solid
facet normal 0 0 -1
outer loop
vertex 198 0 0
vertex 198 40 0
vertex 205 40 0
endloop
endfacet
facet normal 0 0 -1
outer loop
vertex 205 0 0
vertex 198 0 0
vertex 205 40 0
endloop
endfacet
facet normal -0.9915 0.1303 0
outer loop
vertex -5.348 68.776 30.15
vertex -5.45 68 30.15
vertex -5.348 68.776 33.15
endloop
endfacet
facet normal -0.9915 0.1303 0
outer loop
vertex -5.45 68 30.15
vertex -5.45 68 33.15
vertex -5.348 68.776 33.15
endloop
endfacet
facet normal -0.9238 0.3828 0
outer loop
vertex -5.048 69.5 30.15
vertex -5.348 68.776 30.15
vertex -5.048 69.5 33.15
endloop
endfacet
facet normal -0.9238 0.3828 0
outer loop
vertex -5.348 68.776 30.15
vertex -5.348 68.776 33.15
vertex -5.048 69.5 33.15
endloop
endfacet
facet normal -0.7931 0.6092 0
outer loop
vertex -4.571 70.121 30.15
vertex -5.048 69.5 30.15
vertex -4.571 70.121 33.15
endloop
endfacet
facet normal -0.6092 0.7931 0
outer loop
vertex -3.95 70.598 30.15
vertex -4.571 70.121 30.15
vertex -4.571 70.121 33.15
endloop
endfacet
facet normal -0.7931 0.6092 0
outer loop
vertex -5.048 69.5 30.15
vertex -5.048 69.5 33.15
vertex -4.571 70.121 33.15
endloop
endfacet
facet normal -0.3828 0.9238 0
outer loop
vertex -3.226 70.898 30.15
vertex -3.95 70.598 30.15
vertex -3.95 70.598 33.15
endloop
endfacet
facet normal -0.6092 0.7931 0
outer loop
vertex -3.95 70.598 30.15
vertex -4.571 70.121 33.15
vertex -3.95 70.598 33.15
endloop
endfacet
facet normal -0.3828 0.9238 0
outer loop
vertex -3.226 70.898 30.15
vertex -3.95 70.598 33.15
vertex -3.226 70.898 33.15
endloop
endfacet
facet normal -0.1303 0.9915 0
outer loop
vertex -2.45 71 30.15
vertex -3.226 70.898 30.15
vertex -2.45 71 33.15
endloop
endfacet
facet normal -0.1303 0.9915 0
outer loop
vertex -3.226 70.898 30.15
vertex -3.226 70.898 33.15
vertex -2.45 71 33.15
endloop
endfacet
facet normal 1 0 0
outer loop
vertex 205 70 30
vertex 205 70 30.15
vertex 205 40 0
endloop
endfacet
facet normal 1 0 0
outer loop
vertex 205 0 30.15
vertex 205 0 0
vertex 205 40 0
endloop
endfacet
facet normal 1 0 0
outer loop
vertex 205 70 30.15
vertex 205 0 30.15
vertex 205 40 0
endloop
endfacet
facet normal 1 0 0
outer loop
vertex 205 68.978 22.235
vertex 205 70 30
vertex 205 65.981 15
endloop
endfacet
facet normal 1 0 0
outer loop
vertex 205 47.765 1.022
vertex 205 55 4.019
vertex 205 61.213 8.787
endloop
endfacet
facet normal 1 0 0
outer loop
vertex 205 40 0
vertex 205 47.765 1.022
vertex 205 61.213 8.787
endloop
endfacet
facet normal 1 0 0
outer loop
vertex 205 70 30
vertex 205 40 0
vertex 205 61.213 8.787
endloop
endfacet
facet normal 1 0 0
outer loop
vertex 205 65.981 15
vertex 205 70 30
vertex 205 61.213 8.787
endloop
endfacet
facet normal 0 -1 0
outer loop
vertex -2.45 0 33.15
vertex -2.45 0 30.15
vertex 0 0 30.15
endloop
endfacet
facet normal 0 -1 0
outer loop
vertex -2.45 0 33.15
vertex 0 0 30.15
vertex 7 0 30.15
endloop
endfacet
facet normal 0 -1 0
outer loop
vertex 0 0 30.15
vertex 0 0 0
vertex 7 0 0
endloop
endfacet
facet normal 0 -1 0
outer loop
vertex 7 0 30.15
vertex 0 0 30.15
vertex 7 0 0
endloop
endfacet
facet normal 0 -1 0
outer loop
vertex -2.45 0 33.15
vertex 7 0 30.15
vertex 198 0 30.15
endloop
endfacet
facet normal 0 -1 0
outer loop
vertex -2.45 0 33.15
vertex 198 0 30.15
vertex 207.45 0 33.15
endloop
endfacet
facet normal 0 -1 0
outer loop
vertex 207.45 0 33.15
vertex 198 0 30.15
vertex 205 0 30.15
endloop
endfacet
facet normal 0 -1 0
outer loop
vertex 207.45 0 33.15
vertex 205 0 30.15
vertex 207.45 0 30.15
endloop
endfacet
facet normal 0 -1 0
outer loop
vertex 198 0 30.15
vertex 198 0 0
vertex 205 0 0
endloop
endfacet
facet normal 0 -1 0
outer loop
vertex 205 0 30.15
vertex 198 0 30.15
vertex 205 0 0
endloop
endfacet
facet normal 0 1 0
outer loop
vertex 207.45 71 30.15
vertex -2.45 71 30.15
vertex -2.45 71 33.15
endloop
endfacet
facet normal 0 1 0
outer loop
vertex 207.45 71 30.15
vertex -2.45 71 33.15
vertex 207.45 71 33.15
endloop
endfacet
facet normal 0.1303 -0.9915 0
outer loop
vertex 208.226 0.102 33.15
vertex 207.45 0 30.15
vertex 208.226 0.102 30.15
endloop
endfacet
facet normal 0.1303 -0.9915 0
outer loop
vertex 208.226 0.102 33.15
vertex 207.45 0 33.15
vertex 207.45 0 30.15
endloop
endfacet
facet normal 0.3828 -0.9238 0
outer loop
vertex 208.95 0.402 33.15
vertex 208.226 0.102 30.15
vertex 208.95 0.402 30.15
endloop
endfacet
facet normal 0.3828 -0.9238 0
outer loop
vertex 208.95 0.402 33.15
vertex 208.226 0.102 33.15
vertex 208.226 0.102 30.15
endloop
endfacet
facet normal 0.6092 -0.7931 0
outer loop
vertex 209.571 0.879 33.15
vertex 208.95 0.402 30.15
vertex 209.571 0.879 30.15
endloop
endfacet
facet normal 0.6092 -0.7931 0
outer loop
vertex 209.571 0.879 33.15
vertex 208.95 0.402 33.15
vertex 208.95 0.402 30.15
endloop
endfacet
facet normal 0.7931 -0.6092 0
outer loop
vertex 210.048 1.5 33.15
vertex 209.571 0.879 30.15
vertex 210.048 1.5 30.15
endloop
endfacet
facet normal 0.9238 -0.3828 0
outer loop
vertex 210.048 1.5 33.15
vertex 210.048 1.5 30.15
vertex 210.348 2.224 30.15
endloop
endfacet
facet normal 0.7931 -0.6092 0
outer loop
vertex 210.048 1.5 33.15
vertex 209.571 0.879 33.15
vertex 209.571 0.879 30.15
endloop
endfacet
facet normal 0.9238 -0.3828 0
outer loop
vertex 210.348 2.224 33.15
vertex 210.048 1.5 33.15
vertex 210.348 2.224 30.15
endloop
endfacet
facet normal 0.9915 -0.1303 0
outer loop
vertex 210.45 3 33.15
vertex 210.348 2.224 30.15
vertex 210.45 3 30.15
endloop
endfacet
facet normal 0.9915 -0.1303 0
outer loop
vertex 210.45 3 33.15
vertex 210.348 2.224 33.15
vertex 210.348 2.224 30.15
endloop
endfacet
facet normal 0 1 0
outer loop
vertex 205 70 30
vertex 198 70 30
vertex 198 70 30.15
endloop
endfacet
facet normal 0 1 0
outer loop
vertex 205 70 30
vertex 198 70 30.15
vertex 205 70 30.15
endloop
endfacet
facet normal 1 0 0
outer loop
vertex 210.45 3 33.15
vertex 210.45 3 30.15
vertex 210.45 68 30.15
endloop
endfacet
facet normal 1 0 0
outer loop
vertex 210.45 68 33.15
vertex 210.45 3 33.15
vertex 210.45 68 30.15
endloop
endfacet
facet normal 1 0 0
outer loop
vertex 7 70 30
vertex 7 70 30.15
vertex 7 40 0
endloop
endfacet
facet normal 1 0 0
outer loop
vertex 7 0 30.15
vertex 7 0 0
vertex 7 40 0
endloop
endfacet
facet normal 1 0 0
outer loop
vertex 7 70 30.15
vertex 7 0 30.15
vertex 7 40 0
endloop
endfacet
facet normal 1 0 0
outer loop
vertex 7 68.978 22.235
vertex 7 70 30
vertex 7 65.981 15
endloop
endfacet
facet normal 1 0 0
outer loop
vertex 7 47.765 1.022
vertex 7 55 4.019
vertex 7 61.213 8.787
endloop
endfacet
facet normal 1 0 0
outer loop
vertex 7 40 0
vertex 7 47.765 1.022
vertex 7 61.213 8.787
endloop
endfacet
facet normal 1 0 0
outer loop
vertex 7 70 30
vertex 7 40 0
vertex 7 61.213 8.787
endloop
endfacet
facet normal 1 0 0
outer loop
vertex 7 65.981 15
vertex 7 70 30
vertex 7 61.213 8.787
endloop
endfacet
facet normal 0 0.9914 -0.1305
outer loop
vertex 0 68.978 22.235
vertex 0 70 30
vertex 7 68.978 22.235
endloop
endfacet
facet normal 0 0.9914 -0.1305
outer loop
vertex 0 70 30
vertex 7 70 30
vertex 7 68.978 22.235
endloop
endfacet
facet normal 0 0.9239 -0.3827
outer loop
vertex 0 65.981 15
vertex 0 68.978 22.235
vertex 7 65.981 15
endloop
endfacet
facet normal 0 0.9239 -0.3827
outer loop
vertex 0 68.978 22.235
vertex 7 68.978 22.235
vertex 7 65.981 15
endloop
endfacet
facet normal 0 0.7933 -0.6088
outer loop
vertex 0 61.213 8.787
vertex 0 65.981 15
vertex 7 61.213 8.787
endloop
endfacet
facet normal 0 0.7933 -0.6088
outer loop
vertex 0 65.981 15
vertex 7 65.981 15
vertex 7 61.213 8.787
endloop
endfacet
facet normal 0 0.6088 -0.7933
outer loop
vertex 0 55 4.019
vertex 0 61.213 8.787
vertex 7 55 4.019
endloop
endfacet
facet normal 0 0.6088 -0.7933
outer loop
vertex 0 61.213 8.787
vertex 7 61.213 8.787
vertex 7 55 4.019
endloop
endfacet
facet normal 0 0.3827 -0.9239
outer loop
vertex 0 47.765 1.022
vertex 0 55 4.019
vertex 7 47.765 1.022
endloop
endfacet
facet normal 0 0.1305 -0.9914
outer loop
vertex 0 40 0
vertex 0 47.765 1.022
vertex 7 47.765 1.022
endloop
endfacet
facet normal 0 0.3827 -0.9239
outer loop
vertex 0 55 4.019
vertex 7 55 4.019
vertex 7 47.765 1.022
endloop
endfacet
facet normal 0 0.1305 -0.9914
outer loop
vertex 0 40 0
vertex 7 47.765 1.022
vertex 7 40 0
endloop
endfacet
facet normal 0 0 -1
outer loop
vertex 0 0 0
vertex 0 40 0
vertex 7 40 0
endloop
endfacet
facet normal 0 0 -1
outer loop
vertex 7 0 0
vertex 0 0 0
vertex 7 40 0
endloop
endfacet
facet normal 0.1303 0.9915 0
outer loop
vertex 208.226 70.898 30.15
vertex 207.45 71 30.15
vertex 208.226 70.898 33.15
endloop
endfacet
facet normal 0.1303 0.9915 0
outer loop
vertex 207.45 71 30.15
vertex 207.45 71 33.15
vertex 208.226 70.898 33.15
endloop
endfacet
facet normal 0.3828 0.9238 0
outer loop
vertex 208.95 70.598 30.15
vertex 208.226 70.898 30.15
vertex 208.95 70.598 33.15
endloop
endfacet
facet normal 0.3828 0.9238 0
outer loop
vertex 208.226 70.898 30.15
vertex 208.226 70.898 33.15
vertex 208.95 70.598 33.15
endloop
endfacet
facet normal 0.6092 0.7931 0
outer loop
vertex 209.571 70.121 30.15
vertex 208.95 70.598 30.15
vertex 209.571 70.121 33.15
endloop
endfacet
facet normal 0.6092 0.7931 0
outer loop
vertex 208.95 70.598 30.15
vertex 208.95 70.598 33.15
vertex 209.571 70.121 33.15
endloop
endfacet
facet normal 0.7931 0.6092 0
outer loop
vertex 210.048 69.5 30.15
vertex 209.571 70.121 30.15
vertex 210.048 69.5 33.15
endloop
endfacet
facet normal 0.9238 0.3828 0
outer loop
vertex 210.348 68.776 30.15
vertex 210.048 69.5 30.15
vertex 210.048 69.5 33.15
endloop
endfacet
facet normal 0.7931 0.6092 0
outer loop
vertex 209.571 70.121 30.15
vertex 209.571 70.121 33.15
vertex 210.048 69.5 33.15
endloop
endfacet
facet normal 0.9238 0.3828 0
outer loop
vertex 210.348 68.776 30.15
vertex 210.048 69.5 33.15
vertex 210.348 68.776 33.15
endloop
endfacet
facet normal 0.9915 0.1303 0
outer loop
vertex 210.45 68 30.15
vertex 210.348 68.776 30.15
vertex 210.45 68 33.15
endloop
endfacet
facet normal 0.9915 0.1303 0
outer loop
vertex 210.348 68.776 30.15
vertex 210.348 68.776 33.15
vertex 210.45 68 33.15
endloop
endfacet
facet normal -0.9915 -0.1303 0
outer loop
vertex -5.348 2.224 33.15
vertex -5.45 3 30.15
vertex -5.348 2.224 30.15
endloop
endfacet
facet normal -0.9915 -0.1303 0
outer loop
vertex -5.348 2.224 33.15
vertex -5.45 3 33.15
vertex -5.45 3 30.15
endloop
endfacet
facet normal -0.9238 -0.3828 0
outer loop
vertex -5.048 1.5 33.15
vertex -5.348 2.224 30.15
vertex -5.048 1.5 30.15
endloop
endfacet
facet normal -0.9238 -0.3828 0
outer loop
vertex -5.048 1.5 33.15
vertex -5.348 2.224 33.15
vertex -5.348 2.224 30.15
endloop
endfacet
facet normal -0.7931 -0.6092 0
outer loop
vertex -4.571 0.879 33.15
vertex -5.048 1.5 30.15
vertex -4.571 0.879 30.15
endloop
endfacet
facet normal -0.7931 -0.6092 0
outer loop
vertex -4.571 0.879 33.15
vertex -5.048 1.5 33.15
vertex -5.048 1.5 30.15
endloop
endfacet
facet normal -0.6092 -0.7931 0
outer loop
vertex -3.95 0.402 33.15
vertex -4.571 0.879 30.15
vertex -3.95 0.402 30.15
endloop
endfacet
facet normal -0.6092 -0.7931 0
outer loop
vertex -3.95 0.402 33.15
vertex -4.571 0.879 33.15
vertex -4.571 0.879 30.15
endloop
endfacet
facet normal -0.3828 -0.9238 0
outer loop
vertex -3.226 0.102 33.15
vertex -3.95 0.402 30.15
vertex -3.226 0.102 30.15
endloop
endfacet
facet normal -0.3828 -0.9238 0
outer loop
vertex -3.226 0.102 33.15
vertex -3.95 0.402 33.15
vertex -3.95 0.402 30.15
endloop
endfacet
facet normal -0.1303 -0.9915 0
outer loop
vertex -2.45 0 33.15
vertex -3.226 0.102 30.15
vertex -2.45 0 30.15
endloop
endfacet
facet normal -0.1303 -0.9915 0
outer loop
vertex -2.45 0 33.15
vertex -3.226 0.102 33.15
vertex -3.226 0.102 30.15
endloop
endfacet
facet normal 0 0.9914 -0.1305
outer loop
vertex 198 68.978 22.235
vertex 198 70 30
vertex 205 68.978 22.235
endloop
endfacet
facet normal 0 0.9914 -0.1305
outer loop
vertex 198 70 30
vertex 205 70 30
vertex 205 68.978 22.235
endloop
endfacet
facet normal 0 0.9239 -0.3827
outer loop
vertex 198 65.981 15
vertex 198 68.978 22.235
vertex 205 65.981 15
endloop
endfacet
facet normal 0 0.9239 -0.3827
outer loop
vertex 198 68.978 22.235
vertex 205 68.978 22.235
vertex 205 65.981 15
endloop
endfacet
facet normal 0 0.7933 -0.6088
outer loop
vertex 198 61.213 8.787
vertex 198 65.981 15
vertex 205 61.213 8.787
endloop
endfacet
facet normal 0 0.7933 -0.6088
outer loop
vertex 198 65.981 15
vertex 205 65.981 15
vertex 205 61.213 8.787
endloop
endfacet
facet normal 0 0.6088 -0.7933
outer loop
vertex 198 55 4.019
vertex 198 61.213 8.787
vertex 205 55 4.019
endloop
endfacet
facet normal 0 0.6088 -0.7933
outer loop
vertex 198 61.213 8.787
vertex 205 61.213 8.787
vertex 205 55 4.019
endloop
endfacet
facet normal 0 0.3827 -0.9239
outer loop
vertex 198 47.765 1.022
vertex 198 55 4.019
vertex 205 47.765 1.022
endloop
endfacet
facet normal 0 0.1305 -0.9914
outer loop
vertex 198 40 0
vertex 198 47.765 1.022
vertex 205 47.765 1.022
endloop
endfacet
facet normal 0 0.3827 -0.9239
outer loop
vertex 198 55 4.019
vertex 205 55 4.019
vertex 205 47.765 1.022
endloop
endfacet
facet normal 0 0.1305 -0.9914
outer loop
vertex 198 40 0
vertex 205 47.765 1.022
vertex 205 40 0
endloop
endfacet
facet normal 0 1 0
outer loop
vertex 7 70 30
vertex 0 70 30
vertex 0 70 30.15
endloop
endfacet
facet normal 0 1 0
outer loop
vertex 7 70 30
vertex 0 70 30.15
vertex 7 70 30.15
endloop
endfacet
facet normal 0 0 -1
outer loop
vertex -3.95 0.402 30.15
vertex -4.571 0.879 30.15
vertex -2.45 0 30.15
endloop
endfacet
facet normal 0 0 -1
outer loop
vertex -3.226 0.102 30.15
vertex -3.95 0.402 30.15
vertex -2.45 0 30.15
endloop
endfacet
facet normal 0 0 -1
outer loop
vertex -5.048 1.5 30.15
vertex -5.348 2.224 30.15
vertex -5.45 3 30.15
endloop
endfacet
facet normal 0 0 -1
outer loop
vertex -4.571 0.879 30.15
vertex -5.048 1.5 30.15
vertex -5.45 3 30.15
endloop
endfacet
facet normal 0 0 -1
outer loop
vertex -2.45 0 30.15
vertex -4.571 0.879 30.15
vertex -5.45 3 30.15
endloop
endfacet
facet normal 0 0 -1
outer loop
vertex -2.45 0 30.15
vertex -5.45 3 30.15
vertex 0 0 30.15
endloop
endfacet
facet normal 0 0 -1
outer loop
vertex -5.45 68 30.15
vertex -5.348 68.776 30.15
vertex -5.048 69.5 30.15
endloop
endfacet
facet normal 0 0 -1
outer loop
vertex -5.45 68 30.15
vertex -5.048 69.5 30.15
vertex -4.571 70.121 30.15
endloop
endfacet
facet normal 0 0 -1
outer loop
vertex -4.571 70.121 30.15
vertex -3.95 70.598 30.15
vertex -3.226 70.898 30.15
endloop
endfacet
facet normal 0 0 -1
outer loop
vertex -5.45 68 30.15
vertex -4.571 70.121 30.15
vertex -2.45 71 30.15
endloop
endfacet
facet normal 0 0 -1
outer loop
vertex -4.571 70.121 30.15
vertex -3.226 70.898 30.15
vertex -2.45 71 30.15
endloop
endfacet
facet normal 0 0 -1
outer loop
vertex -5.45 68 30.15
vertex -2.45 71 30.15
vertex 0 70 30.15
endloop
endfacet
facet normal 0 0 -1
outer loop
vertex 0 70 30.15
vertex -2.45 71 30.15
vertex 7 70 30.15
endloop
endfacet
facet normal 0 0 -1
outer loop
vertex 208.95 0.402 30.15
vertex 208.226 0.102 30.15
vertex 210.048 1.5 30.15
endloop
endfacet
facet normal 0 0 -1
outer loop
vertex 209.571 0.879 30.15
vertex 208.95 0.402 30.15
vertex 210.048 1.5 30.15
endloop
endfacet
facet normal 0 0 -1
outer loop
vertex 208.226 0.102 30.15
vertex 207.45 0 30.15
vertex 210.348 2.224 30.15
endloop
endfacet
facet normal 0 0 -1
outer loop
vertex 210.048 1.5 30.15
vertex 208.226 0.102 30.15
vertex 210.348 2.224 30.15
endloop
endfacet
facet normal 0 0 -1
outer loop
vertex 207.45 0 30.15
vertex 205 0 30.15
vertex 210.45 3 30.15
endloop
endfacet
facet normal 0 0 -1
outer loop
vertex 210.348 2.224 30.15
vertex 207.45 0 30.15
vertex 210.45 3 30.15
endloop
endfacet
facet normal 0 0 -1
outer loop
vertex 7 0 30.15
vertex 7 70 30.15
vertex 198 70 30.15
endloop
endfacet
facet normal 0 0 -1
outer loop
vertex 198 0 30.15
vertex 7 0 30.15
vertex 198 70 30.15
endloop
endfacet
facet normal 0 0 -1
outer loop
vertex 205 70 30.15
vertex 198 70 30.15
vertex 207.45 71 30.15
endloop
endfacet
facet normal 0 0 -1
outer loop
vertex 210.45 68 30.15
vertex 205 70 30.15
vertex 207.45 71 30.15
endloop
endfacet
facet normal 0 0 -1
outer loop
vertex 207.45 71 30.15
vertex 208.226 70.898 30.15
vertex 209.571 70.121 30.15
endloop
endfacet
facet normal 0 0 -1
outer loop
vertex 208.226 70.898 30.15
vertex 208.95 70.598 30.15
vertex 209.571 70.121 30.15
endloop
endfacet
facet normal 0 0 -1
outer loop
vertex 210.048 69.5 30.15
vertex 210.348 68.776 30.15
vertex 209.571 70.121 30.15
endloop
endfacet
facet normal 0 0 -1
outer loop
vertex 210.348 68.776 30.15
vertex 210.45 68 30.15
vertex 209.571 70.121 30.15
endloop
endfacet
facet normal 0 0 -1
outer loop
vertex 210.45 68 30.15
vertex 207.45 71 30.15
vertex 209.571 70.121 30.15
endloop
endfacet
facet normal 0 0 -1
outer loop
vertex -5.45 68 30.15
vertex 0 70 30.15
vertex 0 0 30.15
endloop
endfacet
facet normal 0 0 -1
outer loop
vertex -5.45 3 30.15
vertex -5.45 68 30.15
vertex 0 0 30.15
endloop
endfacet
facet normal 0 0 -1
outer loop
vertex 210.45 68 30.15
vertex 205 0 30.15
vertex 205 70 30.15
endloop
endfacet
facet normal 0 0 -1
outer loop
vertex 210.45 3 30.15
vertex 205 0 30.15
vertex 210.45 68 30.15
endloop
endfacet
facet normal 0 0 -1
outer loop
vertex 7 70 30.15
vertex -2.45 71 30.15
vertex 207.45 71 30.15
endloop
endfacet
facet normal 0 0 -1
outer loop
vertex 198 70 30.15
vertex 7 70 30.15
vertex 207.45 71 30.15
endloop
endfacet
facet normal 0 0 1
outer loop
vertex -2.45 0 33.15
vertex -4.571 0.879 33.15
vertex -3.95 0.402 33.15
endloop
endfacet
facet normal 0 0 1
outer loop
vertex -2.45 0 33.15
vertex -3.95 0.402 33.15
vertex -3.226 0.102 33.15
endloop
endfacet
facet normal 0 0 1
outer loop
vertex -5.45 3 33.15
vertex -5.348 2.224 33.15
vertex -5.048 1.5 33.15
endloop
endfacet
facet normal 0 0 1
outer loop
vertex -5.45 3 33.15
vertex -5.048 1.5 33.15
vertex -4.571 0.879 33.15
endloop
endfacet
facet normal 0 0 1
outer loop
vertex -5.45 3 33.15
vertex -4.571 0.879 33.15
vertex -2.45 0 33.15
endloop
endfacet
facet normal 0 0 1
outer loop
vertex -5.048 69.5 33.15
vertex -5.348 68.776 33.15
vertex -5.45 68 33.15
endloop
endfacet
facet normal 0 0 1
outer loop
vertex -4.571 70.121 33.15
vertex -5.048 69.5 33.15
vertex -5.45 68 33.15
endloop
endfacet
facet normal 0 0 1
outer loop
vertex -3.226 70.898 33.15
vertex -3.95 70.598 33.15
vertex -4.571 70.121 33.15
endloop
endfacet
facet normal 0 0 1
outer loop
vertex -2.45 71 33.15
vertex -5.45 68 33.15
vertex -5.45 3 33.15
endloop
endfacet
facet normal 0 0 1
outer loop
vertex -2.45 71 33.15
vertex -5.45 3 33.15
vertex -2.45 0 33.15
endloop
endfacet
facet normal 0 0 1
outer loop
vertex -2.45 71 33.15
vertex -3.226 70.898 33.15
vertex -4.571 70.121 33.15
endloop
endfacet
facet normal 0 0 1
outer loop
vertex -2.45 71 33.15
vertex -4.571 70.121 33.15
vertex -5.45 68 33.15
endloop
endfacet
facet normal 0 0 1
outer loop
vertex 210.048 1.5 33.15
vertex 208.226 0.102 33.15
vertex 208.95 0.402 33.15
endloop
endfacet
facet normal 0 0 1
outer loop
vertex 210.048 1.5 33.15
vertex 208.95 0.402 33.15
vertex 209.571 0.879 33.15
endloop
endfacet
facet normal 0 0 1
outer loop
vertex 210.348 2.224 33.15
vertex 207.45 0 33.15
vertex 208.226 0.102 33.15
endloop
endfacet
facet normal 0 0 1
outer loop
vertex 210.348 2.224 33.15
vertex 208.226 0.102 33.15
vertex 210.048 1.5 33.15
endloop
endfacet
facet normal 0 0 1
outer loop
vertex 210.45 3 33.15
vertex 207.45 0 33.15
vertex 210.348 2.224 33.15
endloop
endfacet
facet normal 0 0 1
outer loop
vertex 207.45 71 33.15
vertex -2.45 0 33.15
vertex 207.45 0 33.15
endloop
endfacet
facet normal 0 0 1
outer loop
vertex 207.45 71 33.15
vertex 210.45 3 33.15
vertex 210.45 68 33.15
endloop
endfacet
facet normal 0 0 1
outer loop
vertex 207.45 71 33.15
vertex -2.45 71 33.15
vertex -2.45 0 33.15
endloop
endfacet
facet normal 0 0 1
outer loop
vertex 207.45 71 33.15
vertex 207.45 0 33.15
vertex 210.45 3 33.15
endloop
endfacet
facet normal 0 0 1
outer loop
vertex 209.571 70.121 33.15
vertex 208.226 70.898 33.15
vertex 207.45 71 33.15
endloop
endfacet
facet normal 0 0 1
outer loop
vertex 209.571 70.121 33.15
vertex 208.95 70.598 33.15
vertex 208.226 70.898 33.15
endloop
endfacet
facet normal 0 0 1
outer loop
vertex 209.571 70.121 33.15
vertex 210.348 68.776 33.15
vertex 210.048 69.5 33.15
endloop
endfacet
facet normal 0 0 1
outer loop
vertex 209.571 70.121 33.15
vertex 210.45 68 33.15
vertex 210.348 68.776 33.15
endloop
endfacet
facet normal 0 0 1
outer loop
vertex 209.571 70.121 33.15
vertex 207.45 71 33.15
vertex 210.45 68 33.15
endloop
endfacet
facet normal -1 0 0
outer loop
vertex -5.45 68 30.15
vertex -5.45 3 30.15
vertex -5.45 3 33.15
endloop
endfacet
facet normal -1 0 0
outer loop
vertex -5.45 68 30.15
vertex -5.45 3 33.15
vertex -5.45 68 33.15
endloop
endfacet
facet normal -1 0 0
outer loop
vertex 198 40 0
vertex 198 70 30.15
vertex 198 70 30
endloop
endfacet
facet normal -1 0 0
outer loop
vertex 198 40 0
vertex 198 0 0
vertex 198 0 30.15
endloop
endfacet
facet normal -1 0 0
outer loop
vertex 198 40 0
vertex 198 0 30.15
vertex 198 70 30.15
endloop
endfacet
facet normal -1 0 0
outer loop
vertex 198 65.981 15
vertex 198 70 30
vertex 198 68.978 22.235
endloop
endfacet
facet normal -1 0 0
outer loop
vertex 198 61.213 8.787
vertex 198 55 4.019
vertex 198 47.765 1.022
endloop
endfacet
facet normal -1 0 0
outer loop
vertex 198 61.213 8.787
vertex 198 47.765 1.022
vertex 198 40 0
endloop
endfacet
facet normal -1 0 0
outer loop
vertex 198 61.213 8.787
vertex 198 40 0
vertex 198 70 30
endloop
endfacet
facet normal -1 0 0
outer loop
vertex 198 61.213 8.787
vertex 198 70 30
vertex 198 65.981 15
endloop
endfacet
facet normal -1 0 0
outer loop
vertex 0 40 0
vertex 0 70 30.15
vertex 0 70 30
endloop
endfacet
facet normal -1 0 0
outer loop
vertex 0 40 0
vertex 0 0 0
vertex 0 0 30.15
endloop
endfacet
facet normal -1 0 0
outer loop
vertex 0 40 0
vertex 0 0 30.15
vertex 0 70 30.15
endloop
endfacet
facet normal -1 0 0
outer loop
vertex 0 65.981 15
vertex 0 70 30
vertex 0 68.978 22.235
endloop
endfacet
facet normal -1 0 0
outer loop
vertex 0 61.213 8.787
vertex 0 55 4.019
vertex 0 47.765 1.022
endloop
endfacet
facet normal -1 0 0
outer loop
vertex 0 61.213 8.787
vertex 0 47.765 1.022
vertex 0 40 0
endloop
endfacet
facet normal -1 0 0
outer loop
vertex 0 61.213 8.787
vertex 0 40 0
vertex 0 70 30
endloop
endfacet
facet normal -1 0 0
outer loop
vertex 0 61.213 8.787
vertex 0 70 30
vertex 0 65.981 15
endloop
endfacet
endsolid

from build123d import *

# Parameters (mm, degrees)
SKETCH_1_W        = 7
SKETCH_1_H        = 70
EXTRUDE_1_DEPTH   = 30.15
EXTRUDE_1_2_DEPTH = 30.15
FILLET_1_R        = 30
FILLET_2_R        = 30
SKETCH_2_W        = 215.9
SKETCH_2_H        = 71
EXTRUDE_2_DEPTH   = 3
FILLET_3_R        = 3


with BuildPart() as part:
    # 스케치1 → 보스-돌출1 (new body)
    with BuildSketch(Plane.XY):
        with Locations((3.5, 35)):
            Rectangle(SKETCH_1_W, SKETCH_1_H)
    extrude(amount=EXTRUDE_1_DEPTH)

    # 필렛2
    fillet_2_edges = [part.edges().sort_by_distance(p)[0] for p in [
        (3.5, 70, 0),
    ]]
    fillet(fillet_2_edges, radius=FILLET_2_R)



with BuildPart() as body_2:
    # 스케치1 → Extrude 1 2 (new body)
    with BuildSketch(Plane.XY):
        with Locations((201.5, 35)):
            Rectangle(SKETCH_1_W, SKETCH_1_H)
    extrude(amount=EXTRUDE_1_2_DEPTH)

    # 필렛1
    fillet_1_edges = [body_2.edges().sort_by_distance(p)[0] for p in [
        (201.5, 70, 0),
    ]]
    fillet(fillet_1_edges, radius=FILLET_1_R)


with BuildPart() as part_1:
    add(part.part)

    add(body_2.part)  # 보스-돌출2 merges body 2
    # 스케치2 → 보스-돌출2 (add)
    with BuildSketch(Plane.XY.offset(30.15)):
        with Locations((102.5, 35.5)):
            Rectangle(SKETCH_2_W, SKETCH_2_H)
    extrude(amount=EXTRUDE_2_DEPTH)

    # 필렛3
    fillet_3_edges = [part_1.edges().sort_by_distance(p)[0] for p in [
        (210.45, 0, 31.65),
        (210.45, 71, 31.65),
        (-5.45, 71, 31.65),
        (-5.45, 0, 31.65),
    ]]
    fillet(fillet_3_edges, radius=FILLET_3_R)


solid = part_1.part
